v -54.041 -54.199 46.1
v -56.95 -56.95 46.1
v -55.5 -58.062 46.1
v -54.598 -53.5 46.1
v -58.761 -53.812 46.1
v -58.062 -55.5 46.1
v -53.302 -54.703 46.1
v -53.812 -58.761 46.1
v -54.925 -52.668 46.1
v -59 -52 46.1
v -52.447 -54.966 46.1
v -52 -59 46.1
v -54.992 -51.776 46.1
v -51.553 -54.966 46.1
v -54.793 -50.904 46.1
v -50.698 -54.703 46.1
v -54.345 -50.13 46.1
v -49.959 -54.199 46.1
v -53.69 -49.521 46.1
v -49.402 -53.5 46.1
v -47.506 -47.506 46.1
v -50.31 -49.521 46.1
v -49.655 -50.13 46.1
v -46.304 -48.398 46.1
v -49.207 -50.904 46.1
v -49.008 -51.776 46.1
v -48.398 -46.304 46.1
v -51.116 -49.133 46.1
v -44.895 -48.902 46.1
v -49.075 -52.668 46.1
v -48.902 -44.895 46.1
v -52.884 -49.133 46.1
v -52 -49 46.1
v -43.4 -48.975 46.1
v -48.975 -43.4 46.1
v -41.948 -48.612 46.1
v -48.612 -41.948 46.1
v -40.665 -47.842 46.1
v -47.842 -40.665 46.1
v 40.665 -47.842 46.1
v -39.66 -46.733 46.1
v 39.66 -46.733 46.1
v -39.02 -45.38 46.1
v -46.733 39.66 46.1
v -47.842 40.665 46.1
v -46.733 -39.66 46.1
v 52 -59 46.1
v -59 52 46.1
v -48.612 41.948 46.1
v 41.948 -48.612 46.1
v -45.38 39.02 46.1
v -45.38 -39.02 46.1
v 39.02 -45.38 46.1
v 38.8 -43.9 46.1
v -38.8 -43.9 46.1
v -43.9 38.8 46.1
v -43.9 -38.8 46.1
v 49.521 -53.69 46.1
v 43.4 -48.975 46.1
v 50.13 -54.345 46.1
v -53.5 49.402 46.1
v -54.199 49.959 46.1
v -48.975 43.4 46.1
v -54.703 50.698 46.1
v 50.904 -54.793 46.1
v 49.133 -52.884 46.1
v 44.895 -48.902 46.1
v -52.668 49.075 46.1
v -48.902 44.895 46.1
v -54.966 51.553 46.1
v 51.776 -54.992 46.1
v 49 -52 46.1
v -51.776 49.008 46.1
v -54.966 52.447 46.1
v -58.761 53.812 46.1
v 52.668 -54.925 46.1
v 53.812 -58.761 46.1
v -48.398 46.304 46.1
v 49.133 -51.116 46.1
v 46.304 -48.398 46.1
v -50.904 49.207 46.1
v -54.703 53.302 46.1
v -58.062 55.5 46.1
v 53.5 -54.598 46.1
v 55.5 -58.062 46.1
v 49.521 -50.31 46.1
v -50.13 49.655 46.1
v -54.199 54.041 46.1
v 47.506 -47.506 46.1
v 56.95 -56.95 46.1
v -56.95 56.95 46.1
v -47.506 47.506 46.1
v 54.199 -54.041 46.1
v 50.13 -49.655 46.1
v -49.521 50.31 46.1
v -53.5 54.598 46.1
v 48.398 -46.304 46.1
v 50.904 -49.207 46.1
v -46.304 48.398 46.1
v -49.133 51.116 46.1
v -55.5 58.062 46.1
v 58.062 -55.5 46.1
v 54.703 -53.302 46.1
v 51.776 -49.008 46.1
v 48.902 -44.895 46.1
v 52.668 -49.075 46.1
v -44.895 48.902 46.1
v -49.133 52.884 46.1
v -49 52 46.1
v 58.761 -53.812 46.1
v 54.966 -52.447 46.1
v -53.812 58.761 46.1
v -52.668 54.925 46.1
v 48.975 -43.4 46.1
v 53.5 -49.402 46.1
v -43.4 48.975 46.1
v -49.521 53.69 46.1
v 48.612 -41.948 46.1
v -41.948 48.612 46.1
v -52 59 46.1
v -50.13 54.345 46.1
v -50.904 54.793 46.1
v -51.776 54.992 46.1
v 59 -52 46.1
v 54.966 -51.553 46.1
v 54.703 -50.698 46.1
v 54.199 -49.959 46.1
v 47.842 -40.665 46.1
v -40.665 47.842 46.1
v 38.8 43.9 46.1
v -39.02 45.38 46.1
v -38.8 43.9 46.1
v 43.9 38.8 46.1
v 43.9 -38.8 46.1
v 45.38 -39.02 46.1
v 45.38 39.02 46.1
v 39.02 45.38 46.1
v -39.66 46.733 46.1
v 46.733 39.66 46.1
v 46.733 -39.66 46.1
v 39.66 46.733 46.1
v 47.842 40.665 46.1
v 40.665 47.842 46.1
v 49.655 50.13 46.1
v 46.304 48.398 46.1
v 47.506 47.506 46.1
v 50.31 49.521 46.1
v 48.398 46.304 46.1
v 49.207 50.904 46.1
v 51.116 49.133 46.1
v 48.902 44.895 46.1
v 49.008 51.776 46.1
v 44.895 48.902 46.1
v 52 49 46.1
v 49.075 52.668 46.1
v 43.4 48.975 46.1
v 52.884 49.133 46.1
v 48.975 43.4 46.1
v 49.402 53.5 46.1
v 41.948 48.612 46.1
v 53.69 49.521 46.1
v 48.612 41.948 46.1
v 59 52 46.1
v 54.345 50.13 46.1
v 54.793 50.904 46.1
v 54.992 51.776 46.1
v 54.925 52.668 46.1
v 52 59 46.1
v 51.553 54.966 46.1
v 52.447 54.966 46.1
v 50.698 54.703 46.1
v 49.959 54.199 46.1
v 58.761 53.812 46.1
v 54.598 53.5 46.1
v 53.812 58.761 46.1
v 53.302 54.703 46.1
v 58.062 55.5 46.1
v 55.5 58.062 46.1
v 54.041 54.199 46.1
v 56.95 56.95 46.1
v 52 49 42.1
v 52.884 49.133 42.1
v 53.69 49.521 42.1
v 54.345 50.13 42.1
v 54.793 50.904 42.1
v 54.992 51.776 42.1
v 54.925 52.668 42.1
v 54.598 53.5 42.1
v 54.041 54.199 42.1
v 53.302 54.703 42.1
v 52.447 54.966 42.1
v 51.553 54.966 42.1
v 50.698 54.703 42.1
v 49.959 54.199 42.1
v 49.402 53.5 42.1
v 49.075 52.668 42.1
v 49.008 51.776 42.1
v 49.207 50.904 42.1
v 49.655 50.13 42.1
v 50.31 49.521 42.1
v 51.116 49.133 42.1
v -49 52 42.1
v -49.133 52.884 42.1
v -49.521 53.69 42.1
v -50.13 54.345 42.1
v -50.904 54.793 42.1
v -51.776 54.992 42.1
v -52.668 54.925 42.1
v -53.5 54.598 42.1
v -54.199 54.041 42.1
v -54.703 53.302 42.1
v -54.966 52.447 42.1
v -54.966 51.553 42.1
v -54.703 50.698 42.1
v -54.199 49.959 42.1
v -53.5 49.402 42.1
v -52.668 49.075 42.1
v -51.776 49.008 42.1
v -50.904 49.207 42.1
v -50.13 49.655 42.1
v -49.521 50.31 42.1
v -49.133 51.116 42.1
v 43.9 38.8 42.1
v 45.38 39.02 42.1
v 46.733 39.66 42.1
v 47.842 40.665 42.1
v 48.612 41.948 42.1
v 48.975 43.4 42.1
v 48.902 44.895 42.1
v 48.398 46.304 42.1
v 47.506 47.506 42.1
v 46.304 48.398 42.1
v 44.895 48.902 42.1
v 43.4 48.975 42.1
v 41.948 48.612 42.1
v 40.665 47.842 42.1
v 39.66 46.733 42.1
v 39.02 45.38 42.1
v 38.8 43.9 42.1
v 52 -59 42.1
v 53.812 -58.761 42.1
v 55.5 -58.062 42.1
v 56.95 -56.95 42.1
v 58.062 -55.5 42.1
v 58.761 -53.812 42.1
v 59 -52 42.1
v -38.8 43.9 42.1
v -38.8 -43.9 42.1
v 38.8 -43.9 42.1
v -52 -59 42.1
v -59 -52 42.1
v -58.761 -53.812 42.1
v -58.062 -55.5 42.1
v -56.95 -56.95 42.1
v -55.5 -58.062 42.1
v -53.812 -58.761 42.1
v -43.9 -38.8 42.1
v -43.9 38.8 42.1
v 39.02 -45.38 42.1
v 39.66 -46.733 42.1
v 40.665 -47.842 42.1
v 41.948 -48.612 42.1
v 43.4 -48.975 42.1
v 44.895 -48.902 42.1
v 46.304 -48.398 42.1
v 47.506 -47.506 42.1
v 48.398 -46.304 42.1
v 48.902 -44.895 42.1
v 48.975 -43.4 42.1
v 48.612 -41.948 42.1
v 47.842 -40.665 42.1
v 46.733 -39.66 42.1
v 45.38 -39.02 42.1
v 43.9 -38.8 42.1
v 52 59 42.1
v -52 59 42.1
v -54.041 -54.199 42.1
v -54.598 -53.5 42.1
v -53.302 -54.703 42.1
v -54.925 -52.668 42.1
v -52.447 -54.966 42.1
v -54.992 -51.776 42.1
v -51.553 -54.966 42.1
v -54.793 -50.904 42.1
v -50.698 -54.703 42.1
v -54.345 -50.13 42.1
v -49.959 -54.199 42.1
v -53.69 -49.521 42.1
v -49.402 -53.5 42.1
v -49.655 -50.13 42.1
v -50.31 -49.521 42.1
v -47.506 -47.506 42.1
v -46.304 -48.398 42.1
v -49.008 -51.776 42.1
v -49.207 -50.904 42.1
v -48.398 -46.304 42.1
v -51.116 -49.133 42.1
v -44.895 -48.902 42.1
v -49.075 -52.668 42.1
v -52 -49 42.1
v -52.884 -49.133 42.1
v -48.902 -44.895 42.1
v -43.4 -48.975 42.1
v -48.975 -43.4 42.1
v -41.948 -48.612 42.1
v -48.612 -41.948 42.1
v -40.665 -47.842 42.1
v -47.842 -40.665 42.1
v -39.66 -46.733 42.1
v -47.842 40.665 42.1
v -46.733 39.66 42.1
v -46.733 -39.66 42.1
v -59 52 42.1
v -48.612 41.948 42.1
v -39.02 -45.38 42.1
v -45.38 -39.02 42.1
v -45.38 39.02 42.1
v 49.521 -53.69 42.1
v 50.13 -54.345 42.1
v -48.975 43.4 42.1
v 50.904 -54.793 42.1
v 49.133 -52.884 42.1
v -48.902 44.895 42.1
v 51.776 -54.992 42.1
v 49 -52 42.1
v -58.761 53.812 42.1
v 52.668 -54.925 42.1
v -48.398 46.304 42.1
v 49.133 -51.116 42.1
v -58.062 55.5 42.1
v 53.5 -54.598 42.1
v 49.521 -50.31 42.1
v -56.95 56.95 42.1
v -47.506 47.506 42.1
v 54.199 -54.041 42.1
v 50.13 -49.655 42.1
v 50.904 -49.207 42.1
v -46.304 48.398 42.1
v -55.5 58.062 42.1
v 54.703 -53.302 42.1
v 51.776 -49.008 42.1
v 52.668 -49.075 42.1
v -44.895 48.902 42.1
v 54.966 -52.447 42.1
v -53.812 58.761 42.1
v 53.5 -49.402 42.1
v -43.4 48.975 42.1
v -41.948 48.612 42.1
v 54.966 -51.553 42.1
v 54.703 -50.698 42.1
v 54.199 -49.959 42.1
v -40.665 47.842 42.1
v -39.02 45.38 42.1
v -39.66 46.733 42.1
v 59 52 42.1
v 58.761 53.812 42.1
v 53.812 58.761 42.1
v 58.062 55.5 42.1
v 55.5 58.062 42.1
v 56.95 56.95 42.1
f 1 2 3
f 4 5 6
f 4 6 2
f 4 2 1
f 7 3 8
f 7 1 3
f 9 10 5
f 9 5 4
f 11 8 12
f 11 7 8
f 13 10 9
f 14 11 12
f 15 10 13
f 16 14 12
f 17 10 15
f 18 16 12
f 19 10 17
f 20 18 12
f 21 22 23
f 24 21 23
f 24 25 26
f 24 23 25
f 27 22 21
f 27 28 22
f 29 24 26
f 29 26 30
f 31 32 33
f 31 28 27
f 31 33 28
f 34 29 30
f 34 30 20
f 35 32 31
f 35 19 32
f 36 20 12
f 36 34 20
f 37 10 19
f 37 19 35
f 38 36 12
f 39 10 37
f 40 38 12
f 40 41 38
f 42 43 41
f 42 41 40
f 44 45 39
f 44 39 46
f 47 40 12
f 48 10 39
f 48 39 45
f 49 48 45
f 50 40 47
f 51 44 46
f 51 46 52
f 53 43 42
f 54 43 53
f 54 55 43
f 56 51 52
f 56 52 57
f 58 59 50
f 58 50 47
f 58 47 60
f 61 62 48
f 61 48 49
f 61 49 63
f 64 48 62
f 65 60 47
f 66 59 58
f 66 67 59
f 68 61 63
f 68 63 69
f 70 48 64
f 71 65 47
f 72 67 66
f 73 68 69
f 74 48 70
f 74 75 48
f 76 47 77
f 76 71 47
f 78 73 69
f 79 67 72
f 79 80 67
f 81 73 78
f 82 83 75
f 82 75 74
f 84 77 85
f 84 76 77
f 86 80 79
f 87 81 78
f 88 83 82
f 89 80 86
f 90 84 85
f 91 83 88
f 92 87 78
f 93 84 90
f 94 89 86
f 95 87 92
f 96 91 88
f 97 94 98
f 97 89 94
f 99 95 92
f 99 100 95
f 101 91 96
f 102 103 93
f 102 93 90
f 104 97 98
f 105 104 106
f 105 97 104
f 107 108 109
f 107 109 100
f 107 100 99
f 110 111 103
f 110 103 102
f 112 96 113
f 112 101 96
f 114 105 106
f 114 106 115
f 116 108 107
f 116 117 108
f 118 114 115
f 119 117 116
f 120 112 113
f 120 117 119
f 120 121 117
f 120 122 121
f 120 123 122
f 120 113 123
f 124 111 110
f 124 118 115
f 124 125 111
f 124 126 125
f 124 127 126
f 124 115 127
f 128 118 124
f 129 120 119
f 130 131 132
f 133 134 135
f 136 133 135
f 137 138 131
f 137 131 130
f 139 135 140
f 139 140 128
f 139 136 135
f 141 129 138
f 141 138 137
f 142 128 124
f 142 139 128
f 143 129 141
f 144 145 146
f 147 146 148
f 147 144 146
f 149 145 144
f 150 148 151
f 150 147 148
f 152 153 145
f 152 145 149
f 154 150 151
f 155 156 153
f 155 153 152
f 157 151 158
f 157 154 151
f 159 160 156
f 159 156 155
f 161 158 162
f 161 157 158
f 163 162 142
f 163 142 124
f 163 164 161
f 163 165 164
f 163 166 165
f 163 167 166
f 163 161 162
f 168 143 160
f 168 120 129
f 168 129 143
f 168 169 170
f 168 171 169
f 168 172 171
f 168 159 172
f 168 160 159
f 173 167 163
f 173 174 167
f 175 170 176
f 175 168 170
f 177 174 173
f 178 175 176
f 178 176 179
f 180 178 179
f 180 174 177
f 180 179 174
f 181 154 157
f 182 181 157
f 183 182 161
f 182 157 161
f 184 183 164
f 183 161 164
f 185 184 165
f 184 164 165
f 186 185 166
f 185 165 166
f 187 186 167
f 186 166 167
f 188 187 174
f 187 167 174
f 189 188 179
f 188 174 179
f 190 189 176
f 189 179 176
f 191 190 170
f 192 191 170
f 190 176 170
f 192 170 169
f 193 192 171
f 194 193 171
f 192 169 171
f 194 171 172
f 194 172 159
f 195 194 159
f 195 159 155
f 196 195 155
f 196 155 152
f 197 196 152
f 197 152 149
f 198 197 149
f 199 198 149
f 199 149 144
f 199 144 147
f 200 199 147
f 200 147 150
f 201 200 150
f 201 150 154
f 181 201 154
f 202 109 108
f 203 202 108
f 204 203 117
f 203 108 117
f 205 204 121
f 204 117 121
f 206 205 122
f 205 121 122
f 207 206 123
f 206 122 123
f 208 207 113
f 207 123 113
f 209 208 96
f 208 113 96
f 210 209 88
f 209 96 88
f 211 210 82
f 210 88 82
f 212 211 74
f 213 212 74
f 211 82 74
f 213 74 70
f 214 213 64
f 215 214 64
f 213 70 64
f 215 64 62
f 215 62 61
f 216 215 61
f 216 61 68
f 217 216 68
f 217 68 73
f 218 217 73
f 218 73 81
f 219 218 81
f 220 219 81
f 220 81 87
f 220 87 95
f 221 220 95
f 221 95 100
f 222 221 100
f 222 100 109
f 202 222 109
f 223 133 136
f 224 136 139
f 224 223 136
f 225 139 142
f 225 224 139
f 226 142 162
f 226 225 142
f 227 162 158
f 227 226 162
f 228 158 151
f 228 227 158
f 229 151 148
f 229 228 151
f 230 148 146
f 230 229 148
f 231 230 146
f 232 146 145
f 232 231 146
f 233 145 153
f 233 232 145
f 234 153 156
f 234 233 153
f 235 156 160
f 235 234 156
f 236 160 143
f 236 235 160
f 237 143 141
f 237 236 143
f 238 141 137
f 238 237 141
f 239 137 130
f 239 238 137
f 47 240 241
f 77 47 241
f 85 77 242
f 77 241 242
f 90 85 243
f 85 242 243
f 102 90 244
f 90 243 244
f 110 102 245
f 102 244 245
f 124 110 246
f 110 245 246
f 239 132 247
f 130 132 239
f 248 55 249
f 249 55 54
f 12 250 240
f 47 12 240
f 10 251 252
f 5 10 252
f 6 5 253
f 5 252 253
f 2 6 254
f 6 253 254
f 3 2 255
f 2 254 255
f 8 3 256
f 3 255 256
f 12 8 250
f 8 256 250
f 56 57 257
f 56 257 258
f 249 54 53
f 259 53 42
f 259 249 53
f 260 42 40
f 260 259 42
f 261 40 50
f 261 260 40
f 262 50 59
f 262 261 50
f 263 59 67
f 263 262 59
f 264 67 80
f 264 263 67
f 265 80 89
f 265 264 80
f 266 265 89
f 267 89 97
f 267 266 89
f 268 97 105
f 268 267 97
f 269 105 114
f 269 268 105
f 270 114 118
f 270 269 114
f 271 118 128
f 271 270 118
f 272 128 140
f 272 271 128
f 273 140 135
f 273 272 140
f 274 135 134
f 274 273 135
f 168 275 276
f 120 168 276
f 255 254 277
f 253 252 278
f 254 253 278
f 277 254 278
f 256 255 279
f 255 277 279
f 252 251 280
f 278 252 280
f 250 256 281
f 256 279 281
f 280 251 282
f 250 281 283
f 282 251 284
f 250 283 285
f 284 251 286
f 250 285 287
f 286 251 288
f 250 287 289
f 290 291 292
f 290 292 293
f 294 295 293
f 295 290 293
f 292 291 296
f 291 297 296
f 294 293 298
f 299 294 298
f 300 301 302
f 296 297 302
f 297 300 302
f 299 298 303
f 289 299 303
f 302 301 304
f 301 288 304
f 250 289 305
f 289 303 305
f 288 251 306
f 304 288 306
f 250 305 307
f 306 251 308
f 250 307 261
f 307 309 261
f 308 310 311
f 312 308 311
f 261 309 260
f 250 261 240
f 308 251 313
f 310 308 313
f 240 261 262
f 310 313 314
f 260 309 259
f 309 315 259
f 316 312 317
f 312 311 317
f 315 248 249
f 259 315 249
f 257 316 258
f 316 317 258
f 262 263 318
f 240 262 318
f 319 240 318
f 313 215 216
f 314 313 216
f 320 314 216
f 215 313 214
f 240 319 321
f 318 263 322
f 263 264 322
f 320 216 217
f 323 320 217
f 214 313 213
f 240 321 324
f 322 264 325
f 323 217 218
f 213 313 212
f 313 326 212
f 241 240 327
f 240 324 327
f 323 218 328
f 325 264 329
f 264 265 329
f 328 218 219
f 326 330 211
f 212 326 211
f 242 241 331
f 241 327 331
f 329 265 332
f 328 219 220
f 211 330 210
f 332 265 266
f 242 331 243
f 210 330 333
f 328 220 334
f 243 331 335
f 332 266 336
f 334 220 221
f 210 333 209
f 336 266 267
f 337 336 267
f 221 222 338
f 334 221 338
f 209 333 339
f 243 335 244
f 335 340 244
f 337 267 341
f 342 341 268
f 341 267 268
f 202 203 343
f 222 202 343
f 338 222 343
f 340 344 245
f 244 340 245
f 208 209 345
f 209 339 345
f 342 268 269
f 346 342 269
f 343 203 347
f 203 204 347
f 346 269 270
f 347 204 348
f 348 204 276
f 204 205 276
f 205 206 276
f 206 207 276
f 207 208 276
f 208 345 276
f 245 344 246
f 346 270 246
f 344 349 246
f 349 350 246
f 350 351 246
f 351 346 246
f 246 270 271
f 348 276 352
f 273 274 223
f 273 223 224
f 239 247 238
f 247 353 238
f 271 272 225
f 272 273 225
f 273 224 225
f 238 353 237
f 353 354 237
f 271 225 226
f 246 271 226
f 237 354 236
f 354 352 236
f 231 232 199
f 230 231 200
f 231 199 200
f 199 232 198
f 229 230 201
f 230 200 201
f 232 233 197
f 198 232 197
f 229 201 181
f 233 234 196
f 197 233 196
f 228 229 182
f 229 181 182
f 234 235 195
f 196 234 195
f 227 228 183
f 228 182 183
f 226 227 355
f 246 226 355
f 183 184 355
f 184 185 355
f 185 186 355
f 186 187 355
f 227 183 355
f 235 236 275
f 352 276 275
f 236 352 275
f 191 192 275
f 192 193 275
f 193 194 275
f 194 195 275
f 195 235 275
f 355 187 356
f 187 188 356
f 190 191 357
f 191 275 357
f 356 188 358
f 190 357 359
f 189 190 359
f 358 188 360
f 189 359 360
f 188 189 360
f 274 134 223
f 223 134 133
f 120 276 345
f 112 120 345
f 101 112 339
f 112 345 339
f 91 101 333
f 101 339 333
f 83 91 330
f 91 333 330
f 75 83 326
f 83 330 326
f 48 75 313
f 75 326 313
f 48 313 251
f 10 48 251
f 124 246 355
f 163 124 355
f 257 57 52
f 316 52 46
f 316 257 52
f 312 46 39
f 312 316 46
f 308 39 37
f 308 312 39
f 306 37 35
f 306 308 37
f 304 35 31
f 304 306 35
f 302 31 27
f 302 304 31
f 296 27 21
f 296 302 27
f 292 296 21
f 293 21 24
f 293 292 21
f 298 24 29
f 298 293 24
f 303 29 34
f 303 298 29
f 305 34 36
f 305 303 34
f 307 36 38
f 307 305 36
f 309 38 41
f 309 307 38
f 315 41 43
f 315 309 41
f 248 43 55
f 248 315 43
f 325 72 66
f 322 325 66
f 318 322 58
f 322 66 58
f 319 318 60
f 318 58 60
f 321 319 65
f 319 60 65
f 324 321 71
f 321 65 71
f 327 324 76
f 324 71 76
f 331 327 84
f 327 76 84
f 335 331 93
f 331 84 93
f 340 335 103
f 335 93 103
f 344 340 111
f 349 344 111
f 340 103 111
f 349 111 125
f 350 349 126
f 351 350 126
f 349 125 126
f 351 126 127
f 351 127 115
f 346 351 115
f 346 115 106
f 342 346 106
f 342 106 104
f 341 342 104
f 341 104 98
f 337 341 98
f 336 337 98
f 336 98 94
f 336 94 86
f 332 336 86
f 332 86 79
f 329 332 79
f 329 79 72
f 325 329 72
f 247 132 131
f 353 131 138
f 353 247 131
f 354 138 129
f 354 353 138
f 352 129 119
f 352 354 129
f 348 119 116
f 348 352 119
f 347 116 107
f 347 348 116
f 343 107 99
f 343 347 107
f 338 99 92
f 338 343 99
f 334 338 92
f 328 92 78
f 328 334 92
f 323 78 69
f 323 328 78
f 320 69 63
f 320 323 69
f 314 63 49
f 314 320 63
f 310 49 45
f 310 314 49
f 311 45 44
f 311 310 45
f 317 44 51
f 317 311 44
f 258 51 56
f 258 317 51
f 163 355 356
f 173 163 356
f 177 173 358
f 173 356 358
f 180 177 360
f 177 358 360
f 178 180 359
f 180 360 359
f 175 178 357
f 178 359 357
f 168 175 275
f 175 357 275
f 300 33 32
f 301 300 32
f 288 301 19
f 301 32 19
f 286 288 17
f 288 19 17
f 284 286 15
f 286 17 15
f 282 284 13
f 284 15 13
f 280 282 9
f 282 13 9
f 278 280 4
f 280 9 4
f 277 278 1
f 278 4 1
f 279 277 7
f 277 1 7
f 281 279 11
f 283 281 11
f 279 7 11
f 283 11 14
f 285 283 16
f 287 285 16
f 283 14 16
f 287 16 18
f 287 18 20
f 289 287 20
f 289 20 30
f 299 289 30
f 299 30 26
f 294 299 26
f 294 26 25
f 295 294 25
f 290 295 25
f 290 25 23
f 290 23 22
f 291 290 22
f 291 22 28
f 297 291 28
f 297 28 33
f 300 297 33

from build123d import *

# Parameters (mm, degrees)
PAD017_DEPTH          = 4
SKETCH037_R           = 5.1
POCKET015_DEPTH       = 5
POLARPATTERN010_COUNT = 4
SKETCH038_W           = 87.800004
SKETCH038_H           = 87.800004
POCKET016_DEPTH       = 5
SKETCH039_R           = 3
POCKET017_DEPTH       = 337.8512658378
POLARPATTERN011_COUNT = 4


with BuildPart() as part:
    # Sketch036 → Pad017 (new body)
    with BuildSketch(Plane.XY):
        with BuildLine():
            Line((-59, 52), (-59, -52))
            ThreePointArc((-59, -52), (-56.9497474683, -56.9497474683), (-52, -59))
            Line((-52, -59), (52, -59))
            ThreePointArc((52, -59), (56.9497474683, -56.9497474683), (59, -52))
            Line((59, -52), (59, 52))
            ThreePointArc((59, 52), (56.9497474683, 56.9497474683), (52, 59))
            Line((52, 59), (-52, 59))
            ThreePointArc((-52, 59), (-56.9497474683, 56.9497474683), (-59, 52))
        make_face()
    extrude(amount=PAD017_DEPTH)

    # Sketch037 → Pocket015 (cut)
    with BuildSketch(Plane.XY):
        with Locations((-43.9, 43.9)):
            Circle(SKETCH037_R)
    pocket015 = extrude(amount=POCKET015_DEPTH, mode=Mode.SUBTRACT)

    # PolarPattern010: Pocket015 ×4 about axis
    polarpattern010_axis = Axis((0, 0, 0), (0, 0, 1))
    for i in range(1, POLARPATTERN010_COUNT):
        add(pocket015.rotate(polarpattern010_axis, i * 360 / POLARPATTERN010_COUNT), mode=Mode.SUBTRACT)

    # Sketch038 (on Face5 of PolarPattern010) → Pocket016 (cut)
    with BuildSketch(Plane.XY.offset(4)):
        Rectangle(SKETCH038_W, SKETCH038_H)
    extrude(amount=-POCKET016_DEPTH, mode=Mode.SUBTRACT)

    # Sketch039 (on Face5 of Pocket016) → Pocket017 (cut, through all)
    with BuildSketch(Plane.XY.offset(4)):
        with Locations((-52, 52)):
            Circle(SKETCH039_R)
    pocket017 = extrude(amount=-POCKET017_DEPTH, mode=Mode.SUBTRACT)

    # PolarPattern011: Pocket017 ×4 about axis
    polarpattern011_axis = Axis((0, 0, 4), (0, 0, 1))
    for i in range(1, POLARPATTERN011_COUNT):
        add(pocket017.rotate(polarpattern011_axis, i * 360 / POLARPATTERN011_COUNT), mode=Mode.SUBTRACT)


with BuildPart() as part_1:
    # Body006 placement: moved
    add(part.part.moved(Location((0, 0, 42.1))))


solid = part_1.part
